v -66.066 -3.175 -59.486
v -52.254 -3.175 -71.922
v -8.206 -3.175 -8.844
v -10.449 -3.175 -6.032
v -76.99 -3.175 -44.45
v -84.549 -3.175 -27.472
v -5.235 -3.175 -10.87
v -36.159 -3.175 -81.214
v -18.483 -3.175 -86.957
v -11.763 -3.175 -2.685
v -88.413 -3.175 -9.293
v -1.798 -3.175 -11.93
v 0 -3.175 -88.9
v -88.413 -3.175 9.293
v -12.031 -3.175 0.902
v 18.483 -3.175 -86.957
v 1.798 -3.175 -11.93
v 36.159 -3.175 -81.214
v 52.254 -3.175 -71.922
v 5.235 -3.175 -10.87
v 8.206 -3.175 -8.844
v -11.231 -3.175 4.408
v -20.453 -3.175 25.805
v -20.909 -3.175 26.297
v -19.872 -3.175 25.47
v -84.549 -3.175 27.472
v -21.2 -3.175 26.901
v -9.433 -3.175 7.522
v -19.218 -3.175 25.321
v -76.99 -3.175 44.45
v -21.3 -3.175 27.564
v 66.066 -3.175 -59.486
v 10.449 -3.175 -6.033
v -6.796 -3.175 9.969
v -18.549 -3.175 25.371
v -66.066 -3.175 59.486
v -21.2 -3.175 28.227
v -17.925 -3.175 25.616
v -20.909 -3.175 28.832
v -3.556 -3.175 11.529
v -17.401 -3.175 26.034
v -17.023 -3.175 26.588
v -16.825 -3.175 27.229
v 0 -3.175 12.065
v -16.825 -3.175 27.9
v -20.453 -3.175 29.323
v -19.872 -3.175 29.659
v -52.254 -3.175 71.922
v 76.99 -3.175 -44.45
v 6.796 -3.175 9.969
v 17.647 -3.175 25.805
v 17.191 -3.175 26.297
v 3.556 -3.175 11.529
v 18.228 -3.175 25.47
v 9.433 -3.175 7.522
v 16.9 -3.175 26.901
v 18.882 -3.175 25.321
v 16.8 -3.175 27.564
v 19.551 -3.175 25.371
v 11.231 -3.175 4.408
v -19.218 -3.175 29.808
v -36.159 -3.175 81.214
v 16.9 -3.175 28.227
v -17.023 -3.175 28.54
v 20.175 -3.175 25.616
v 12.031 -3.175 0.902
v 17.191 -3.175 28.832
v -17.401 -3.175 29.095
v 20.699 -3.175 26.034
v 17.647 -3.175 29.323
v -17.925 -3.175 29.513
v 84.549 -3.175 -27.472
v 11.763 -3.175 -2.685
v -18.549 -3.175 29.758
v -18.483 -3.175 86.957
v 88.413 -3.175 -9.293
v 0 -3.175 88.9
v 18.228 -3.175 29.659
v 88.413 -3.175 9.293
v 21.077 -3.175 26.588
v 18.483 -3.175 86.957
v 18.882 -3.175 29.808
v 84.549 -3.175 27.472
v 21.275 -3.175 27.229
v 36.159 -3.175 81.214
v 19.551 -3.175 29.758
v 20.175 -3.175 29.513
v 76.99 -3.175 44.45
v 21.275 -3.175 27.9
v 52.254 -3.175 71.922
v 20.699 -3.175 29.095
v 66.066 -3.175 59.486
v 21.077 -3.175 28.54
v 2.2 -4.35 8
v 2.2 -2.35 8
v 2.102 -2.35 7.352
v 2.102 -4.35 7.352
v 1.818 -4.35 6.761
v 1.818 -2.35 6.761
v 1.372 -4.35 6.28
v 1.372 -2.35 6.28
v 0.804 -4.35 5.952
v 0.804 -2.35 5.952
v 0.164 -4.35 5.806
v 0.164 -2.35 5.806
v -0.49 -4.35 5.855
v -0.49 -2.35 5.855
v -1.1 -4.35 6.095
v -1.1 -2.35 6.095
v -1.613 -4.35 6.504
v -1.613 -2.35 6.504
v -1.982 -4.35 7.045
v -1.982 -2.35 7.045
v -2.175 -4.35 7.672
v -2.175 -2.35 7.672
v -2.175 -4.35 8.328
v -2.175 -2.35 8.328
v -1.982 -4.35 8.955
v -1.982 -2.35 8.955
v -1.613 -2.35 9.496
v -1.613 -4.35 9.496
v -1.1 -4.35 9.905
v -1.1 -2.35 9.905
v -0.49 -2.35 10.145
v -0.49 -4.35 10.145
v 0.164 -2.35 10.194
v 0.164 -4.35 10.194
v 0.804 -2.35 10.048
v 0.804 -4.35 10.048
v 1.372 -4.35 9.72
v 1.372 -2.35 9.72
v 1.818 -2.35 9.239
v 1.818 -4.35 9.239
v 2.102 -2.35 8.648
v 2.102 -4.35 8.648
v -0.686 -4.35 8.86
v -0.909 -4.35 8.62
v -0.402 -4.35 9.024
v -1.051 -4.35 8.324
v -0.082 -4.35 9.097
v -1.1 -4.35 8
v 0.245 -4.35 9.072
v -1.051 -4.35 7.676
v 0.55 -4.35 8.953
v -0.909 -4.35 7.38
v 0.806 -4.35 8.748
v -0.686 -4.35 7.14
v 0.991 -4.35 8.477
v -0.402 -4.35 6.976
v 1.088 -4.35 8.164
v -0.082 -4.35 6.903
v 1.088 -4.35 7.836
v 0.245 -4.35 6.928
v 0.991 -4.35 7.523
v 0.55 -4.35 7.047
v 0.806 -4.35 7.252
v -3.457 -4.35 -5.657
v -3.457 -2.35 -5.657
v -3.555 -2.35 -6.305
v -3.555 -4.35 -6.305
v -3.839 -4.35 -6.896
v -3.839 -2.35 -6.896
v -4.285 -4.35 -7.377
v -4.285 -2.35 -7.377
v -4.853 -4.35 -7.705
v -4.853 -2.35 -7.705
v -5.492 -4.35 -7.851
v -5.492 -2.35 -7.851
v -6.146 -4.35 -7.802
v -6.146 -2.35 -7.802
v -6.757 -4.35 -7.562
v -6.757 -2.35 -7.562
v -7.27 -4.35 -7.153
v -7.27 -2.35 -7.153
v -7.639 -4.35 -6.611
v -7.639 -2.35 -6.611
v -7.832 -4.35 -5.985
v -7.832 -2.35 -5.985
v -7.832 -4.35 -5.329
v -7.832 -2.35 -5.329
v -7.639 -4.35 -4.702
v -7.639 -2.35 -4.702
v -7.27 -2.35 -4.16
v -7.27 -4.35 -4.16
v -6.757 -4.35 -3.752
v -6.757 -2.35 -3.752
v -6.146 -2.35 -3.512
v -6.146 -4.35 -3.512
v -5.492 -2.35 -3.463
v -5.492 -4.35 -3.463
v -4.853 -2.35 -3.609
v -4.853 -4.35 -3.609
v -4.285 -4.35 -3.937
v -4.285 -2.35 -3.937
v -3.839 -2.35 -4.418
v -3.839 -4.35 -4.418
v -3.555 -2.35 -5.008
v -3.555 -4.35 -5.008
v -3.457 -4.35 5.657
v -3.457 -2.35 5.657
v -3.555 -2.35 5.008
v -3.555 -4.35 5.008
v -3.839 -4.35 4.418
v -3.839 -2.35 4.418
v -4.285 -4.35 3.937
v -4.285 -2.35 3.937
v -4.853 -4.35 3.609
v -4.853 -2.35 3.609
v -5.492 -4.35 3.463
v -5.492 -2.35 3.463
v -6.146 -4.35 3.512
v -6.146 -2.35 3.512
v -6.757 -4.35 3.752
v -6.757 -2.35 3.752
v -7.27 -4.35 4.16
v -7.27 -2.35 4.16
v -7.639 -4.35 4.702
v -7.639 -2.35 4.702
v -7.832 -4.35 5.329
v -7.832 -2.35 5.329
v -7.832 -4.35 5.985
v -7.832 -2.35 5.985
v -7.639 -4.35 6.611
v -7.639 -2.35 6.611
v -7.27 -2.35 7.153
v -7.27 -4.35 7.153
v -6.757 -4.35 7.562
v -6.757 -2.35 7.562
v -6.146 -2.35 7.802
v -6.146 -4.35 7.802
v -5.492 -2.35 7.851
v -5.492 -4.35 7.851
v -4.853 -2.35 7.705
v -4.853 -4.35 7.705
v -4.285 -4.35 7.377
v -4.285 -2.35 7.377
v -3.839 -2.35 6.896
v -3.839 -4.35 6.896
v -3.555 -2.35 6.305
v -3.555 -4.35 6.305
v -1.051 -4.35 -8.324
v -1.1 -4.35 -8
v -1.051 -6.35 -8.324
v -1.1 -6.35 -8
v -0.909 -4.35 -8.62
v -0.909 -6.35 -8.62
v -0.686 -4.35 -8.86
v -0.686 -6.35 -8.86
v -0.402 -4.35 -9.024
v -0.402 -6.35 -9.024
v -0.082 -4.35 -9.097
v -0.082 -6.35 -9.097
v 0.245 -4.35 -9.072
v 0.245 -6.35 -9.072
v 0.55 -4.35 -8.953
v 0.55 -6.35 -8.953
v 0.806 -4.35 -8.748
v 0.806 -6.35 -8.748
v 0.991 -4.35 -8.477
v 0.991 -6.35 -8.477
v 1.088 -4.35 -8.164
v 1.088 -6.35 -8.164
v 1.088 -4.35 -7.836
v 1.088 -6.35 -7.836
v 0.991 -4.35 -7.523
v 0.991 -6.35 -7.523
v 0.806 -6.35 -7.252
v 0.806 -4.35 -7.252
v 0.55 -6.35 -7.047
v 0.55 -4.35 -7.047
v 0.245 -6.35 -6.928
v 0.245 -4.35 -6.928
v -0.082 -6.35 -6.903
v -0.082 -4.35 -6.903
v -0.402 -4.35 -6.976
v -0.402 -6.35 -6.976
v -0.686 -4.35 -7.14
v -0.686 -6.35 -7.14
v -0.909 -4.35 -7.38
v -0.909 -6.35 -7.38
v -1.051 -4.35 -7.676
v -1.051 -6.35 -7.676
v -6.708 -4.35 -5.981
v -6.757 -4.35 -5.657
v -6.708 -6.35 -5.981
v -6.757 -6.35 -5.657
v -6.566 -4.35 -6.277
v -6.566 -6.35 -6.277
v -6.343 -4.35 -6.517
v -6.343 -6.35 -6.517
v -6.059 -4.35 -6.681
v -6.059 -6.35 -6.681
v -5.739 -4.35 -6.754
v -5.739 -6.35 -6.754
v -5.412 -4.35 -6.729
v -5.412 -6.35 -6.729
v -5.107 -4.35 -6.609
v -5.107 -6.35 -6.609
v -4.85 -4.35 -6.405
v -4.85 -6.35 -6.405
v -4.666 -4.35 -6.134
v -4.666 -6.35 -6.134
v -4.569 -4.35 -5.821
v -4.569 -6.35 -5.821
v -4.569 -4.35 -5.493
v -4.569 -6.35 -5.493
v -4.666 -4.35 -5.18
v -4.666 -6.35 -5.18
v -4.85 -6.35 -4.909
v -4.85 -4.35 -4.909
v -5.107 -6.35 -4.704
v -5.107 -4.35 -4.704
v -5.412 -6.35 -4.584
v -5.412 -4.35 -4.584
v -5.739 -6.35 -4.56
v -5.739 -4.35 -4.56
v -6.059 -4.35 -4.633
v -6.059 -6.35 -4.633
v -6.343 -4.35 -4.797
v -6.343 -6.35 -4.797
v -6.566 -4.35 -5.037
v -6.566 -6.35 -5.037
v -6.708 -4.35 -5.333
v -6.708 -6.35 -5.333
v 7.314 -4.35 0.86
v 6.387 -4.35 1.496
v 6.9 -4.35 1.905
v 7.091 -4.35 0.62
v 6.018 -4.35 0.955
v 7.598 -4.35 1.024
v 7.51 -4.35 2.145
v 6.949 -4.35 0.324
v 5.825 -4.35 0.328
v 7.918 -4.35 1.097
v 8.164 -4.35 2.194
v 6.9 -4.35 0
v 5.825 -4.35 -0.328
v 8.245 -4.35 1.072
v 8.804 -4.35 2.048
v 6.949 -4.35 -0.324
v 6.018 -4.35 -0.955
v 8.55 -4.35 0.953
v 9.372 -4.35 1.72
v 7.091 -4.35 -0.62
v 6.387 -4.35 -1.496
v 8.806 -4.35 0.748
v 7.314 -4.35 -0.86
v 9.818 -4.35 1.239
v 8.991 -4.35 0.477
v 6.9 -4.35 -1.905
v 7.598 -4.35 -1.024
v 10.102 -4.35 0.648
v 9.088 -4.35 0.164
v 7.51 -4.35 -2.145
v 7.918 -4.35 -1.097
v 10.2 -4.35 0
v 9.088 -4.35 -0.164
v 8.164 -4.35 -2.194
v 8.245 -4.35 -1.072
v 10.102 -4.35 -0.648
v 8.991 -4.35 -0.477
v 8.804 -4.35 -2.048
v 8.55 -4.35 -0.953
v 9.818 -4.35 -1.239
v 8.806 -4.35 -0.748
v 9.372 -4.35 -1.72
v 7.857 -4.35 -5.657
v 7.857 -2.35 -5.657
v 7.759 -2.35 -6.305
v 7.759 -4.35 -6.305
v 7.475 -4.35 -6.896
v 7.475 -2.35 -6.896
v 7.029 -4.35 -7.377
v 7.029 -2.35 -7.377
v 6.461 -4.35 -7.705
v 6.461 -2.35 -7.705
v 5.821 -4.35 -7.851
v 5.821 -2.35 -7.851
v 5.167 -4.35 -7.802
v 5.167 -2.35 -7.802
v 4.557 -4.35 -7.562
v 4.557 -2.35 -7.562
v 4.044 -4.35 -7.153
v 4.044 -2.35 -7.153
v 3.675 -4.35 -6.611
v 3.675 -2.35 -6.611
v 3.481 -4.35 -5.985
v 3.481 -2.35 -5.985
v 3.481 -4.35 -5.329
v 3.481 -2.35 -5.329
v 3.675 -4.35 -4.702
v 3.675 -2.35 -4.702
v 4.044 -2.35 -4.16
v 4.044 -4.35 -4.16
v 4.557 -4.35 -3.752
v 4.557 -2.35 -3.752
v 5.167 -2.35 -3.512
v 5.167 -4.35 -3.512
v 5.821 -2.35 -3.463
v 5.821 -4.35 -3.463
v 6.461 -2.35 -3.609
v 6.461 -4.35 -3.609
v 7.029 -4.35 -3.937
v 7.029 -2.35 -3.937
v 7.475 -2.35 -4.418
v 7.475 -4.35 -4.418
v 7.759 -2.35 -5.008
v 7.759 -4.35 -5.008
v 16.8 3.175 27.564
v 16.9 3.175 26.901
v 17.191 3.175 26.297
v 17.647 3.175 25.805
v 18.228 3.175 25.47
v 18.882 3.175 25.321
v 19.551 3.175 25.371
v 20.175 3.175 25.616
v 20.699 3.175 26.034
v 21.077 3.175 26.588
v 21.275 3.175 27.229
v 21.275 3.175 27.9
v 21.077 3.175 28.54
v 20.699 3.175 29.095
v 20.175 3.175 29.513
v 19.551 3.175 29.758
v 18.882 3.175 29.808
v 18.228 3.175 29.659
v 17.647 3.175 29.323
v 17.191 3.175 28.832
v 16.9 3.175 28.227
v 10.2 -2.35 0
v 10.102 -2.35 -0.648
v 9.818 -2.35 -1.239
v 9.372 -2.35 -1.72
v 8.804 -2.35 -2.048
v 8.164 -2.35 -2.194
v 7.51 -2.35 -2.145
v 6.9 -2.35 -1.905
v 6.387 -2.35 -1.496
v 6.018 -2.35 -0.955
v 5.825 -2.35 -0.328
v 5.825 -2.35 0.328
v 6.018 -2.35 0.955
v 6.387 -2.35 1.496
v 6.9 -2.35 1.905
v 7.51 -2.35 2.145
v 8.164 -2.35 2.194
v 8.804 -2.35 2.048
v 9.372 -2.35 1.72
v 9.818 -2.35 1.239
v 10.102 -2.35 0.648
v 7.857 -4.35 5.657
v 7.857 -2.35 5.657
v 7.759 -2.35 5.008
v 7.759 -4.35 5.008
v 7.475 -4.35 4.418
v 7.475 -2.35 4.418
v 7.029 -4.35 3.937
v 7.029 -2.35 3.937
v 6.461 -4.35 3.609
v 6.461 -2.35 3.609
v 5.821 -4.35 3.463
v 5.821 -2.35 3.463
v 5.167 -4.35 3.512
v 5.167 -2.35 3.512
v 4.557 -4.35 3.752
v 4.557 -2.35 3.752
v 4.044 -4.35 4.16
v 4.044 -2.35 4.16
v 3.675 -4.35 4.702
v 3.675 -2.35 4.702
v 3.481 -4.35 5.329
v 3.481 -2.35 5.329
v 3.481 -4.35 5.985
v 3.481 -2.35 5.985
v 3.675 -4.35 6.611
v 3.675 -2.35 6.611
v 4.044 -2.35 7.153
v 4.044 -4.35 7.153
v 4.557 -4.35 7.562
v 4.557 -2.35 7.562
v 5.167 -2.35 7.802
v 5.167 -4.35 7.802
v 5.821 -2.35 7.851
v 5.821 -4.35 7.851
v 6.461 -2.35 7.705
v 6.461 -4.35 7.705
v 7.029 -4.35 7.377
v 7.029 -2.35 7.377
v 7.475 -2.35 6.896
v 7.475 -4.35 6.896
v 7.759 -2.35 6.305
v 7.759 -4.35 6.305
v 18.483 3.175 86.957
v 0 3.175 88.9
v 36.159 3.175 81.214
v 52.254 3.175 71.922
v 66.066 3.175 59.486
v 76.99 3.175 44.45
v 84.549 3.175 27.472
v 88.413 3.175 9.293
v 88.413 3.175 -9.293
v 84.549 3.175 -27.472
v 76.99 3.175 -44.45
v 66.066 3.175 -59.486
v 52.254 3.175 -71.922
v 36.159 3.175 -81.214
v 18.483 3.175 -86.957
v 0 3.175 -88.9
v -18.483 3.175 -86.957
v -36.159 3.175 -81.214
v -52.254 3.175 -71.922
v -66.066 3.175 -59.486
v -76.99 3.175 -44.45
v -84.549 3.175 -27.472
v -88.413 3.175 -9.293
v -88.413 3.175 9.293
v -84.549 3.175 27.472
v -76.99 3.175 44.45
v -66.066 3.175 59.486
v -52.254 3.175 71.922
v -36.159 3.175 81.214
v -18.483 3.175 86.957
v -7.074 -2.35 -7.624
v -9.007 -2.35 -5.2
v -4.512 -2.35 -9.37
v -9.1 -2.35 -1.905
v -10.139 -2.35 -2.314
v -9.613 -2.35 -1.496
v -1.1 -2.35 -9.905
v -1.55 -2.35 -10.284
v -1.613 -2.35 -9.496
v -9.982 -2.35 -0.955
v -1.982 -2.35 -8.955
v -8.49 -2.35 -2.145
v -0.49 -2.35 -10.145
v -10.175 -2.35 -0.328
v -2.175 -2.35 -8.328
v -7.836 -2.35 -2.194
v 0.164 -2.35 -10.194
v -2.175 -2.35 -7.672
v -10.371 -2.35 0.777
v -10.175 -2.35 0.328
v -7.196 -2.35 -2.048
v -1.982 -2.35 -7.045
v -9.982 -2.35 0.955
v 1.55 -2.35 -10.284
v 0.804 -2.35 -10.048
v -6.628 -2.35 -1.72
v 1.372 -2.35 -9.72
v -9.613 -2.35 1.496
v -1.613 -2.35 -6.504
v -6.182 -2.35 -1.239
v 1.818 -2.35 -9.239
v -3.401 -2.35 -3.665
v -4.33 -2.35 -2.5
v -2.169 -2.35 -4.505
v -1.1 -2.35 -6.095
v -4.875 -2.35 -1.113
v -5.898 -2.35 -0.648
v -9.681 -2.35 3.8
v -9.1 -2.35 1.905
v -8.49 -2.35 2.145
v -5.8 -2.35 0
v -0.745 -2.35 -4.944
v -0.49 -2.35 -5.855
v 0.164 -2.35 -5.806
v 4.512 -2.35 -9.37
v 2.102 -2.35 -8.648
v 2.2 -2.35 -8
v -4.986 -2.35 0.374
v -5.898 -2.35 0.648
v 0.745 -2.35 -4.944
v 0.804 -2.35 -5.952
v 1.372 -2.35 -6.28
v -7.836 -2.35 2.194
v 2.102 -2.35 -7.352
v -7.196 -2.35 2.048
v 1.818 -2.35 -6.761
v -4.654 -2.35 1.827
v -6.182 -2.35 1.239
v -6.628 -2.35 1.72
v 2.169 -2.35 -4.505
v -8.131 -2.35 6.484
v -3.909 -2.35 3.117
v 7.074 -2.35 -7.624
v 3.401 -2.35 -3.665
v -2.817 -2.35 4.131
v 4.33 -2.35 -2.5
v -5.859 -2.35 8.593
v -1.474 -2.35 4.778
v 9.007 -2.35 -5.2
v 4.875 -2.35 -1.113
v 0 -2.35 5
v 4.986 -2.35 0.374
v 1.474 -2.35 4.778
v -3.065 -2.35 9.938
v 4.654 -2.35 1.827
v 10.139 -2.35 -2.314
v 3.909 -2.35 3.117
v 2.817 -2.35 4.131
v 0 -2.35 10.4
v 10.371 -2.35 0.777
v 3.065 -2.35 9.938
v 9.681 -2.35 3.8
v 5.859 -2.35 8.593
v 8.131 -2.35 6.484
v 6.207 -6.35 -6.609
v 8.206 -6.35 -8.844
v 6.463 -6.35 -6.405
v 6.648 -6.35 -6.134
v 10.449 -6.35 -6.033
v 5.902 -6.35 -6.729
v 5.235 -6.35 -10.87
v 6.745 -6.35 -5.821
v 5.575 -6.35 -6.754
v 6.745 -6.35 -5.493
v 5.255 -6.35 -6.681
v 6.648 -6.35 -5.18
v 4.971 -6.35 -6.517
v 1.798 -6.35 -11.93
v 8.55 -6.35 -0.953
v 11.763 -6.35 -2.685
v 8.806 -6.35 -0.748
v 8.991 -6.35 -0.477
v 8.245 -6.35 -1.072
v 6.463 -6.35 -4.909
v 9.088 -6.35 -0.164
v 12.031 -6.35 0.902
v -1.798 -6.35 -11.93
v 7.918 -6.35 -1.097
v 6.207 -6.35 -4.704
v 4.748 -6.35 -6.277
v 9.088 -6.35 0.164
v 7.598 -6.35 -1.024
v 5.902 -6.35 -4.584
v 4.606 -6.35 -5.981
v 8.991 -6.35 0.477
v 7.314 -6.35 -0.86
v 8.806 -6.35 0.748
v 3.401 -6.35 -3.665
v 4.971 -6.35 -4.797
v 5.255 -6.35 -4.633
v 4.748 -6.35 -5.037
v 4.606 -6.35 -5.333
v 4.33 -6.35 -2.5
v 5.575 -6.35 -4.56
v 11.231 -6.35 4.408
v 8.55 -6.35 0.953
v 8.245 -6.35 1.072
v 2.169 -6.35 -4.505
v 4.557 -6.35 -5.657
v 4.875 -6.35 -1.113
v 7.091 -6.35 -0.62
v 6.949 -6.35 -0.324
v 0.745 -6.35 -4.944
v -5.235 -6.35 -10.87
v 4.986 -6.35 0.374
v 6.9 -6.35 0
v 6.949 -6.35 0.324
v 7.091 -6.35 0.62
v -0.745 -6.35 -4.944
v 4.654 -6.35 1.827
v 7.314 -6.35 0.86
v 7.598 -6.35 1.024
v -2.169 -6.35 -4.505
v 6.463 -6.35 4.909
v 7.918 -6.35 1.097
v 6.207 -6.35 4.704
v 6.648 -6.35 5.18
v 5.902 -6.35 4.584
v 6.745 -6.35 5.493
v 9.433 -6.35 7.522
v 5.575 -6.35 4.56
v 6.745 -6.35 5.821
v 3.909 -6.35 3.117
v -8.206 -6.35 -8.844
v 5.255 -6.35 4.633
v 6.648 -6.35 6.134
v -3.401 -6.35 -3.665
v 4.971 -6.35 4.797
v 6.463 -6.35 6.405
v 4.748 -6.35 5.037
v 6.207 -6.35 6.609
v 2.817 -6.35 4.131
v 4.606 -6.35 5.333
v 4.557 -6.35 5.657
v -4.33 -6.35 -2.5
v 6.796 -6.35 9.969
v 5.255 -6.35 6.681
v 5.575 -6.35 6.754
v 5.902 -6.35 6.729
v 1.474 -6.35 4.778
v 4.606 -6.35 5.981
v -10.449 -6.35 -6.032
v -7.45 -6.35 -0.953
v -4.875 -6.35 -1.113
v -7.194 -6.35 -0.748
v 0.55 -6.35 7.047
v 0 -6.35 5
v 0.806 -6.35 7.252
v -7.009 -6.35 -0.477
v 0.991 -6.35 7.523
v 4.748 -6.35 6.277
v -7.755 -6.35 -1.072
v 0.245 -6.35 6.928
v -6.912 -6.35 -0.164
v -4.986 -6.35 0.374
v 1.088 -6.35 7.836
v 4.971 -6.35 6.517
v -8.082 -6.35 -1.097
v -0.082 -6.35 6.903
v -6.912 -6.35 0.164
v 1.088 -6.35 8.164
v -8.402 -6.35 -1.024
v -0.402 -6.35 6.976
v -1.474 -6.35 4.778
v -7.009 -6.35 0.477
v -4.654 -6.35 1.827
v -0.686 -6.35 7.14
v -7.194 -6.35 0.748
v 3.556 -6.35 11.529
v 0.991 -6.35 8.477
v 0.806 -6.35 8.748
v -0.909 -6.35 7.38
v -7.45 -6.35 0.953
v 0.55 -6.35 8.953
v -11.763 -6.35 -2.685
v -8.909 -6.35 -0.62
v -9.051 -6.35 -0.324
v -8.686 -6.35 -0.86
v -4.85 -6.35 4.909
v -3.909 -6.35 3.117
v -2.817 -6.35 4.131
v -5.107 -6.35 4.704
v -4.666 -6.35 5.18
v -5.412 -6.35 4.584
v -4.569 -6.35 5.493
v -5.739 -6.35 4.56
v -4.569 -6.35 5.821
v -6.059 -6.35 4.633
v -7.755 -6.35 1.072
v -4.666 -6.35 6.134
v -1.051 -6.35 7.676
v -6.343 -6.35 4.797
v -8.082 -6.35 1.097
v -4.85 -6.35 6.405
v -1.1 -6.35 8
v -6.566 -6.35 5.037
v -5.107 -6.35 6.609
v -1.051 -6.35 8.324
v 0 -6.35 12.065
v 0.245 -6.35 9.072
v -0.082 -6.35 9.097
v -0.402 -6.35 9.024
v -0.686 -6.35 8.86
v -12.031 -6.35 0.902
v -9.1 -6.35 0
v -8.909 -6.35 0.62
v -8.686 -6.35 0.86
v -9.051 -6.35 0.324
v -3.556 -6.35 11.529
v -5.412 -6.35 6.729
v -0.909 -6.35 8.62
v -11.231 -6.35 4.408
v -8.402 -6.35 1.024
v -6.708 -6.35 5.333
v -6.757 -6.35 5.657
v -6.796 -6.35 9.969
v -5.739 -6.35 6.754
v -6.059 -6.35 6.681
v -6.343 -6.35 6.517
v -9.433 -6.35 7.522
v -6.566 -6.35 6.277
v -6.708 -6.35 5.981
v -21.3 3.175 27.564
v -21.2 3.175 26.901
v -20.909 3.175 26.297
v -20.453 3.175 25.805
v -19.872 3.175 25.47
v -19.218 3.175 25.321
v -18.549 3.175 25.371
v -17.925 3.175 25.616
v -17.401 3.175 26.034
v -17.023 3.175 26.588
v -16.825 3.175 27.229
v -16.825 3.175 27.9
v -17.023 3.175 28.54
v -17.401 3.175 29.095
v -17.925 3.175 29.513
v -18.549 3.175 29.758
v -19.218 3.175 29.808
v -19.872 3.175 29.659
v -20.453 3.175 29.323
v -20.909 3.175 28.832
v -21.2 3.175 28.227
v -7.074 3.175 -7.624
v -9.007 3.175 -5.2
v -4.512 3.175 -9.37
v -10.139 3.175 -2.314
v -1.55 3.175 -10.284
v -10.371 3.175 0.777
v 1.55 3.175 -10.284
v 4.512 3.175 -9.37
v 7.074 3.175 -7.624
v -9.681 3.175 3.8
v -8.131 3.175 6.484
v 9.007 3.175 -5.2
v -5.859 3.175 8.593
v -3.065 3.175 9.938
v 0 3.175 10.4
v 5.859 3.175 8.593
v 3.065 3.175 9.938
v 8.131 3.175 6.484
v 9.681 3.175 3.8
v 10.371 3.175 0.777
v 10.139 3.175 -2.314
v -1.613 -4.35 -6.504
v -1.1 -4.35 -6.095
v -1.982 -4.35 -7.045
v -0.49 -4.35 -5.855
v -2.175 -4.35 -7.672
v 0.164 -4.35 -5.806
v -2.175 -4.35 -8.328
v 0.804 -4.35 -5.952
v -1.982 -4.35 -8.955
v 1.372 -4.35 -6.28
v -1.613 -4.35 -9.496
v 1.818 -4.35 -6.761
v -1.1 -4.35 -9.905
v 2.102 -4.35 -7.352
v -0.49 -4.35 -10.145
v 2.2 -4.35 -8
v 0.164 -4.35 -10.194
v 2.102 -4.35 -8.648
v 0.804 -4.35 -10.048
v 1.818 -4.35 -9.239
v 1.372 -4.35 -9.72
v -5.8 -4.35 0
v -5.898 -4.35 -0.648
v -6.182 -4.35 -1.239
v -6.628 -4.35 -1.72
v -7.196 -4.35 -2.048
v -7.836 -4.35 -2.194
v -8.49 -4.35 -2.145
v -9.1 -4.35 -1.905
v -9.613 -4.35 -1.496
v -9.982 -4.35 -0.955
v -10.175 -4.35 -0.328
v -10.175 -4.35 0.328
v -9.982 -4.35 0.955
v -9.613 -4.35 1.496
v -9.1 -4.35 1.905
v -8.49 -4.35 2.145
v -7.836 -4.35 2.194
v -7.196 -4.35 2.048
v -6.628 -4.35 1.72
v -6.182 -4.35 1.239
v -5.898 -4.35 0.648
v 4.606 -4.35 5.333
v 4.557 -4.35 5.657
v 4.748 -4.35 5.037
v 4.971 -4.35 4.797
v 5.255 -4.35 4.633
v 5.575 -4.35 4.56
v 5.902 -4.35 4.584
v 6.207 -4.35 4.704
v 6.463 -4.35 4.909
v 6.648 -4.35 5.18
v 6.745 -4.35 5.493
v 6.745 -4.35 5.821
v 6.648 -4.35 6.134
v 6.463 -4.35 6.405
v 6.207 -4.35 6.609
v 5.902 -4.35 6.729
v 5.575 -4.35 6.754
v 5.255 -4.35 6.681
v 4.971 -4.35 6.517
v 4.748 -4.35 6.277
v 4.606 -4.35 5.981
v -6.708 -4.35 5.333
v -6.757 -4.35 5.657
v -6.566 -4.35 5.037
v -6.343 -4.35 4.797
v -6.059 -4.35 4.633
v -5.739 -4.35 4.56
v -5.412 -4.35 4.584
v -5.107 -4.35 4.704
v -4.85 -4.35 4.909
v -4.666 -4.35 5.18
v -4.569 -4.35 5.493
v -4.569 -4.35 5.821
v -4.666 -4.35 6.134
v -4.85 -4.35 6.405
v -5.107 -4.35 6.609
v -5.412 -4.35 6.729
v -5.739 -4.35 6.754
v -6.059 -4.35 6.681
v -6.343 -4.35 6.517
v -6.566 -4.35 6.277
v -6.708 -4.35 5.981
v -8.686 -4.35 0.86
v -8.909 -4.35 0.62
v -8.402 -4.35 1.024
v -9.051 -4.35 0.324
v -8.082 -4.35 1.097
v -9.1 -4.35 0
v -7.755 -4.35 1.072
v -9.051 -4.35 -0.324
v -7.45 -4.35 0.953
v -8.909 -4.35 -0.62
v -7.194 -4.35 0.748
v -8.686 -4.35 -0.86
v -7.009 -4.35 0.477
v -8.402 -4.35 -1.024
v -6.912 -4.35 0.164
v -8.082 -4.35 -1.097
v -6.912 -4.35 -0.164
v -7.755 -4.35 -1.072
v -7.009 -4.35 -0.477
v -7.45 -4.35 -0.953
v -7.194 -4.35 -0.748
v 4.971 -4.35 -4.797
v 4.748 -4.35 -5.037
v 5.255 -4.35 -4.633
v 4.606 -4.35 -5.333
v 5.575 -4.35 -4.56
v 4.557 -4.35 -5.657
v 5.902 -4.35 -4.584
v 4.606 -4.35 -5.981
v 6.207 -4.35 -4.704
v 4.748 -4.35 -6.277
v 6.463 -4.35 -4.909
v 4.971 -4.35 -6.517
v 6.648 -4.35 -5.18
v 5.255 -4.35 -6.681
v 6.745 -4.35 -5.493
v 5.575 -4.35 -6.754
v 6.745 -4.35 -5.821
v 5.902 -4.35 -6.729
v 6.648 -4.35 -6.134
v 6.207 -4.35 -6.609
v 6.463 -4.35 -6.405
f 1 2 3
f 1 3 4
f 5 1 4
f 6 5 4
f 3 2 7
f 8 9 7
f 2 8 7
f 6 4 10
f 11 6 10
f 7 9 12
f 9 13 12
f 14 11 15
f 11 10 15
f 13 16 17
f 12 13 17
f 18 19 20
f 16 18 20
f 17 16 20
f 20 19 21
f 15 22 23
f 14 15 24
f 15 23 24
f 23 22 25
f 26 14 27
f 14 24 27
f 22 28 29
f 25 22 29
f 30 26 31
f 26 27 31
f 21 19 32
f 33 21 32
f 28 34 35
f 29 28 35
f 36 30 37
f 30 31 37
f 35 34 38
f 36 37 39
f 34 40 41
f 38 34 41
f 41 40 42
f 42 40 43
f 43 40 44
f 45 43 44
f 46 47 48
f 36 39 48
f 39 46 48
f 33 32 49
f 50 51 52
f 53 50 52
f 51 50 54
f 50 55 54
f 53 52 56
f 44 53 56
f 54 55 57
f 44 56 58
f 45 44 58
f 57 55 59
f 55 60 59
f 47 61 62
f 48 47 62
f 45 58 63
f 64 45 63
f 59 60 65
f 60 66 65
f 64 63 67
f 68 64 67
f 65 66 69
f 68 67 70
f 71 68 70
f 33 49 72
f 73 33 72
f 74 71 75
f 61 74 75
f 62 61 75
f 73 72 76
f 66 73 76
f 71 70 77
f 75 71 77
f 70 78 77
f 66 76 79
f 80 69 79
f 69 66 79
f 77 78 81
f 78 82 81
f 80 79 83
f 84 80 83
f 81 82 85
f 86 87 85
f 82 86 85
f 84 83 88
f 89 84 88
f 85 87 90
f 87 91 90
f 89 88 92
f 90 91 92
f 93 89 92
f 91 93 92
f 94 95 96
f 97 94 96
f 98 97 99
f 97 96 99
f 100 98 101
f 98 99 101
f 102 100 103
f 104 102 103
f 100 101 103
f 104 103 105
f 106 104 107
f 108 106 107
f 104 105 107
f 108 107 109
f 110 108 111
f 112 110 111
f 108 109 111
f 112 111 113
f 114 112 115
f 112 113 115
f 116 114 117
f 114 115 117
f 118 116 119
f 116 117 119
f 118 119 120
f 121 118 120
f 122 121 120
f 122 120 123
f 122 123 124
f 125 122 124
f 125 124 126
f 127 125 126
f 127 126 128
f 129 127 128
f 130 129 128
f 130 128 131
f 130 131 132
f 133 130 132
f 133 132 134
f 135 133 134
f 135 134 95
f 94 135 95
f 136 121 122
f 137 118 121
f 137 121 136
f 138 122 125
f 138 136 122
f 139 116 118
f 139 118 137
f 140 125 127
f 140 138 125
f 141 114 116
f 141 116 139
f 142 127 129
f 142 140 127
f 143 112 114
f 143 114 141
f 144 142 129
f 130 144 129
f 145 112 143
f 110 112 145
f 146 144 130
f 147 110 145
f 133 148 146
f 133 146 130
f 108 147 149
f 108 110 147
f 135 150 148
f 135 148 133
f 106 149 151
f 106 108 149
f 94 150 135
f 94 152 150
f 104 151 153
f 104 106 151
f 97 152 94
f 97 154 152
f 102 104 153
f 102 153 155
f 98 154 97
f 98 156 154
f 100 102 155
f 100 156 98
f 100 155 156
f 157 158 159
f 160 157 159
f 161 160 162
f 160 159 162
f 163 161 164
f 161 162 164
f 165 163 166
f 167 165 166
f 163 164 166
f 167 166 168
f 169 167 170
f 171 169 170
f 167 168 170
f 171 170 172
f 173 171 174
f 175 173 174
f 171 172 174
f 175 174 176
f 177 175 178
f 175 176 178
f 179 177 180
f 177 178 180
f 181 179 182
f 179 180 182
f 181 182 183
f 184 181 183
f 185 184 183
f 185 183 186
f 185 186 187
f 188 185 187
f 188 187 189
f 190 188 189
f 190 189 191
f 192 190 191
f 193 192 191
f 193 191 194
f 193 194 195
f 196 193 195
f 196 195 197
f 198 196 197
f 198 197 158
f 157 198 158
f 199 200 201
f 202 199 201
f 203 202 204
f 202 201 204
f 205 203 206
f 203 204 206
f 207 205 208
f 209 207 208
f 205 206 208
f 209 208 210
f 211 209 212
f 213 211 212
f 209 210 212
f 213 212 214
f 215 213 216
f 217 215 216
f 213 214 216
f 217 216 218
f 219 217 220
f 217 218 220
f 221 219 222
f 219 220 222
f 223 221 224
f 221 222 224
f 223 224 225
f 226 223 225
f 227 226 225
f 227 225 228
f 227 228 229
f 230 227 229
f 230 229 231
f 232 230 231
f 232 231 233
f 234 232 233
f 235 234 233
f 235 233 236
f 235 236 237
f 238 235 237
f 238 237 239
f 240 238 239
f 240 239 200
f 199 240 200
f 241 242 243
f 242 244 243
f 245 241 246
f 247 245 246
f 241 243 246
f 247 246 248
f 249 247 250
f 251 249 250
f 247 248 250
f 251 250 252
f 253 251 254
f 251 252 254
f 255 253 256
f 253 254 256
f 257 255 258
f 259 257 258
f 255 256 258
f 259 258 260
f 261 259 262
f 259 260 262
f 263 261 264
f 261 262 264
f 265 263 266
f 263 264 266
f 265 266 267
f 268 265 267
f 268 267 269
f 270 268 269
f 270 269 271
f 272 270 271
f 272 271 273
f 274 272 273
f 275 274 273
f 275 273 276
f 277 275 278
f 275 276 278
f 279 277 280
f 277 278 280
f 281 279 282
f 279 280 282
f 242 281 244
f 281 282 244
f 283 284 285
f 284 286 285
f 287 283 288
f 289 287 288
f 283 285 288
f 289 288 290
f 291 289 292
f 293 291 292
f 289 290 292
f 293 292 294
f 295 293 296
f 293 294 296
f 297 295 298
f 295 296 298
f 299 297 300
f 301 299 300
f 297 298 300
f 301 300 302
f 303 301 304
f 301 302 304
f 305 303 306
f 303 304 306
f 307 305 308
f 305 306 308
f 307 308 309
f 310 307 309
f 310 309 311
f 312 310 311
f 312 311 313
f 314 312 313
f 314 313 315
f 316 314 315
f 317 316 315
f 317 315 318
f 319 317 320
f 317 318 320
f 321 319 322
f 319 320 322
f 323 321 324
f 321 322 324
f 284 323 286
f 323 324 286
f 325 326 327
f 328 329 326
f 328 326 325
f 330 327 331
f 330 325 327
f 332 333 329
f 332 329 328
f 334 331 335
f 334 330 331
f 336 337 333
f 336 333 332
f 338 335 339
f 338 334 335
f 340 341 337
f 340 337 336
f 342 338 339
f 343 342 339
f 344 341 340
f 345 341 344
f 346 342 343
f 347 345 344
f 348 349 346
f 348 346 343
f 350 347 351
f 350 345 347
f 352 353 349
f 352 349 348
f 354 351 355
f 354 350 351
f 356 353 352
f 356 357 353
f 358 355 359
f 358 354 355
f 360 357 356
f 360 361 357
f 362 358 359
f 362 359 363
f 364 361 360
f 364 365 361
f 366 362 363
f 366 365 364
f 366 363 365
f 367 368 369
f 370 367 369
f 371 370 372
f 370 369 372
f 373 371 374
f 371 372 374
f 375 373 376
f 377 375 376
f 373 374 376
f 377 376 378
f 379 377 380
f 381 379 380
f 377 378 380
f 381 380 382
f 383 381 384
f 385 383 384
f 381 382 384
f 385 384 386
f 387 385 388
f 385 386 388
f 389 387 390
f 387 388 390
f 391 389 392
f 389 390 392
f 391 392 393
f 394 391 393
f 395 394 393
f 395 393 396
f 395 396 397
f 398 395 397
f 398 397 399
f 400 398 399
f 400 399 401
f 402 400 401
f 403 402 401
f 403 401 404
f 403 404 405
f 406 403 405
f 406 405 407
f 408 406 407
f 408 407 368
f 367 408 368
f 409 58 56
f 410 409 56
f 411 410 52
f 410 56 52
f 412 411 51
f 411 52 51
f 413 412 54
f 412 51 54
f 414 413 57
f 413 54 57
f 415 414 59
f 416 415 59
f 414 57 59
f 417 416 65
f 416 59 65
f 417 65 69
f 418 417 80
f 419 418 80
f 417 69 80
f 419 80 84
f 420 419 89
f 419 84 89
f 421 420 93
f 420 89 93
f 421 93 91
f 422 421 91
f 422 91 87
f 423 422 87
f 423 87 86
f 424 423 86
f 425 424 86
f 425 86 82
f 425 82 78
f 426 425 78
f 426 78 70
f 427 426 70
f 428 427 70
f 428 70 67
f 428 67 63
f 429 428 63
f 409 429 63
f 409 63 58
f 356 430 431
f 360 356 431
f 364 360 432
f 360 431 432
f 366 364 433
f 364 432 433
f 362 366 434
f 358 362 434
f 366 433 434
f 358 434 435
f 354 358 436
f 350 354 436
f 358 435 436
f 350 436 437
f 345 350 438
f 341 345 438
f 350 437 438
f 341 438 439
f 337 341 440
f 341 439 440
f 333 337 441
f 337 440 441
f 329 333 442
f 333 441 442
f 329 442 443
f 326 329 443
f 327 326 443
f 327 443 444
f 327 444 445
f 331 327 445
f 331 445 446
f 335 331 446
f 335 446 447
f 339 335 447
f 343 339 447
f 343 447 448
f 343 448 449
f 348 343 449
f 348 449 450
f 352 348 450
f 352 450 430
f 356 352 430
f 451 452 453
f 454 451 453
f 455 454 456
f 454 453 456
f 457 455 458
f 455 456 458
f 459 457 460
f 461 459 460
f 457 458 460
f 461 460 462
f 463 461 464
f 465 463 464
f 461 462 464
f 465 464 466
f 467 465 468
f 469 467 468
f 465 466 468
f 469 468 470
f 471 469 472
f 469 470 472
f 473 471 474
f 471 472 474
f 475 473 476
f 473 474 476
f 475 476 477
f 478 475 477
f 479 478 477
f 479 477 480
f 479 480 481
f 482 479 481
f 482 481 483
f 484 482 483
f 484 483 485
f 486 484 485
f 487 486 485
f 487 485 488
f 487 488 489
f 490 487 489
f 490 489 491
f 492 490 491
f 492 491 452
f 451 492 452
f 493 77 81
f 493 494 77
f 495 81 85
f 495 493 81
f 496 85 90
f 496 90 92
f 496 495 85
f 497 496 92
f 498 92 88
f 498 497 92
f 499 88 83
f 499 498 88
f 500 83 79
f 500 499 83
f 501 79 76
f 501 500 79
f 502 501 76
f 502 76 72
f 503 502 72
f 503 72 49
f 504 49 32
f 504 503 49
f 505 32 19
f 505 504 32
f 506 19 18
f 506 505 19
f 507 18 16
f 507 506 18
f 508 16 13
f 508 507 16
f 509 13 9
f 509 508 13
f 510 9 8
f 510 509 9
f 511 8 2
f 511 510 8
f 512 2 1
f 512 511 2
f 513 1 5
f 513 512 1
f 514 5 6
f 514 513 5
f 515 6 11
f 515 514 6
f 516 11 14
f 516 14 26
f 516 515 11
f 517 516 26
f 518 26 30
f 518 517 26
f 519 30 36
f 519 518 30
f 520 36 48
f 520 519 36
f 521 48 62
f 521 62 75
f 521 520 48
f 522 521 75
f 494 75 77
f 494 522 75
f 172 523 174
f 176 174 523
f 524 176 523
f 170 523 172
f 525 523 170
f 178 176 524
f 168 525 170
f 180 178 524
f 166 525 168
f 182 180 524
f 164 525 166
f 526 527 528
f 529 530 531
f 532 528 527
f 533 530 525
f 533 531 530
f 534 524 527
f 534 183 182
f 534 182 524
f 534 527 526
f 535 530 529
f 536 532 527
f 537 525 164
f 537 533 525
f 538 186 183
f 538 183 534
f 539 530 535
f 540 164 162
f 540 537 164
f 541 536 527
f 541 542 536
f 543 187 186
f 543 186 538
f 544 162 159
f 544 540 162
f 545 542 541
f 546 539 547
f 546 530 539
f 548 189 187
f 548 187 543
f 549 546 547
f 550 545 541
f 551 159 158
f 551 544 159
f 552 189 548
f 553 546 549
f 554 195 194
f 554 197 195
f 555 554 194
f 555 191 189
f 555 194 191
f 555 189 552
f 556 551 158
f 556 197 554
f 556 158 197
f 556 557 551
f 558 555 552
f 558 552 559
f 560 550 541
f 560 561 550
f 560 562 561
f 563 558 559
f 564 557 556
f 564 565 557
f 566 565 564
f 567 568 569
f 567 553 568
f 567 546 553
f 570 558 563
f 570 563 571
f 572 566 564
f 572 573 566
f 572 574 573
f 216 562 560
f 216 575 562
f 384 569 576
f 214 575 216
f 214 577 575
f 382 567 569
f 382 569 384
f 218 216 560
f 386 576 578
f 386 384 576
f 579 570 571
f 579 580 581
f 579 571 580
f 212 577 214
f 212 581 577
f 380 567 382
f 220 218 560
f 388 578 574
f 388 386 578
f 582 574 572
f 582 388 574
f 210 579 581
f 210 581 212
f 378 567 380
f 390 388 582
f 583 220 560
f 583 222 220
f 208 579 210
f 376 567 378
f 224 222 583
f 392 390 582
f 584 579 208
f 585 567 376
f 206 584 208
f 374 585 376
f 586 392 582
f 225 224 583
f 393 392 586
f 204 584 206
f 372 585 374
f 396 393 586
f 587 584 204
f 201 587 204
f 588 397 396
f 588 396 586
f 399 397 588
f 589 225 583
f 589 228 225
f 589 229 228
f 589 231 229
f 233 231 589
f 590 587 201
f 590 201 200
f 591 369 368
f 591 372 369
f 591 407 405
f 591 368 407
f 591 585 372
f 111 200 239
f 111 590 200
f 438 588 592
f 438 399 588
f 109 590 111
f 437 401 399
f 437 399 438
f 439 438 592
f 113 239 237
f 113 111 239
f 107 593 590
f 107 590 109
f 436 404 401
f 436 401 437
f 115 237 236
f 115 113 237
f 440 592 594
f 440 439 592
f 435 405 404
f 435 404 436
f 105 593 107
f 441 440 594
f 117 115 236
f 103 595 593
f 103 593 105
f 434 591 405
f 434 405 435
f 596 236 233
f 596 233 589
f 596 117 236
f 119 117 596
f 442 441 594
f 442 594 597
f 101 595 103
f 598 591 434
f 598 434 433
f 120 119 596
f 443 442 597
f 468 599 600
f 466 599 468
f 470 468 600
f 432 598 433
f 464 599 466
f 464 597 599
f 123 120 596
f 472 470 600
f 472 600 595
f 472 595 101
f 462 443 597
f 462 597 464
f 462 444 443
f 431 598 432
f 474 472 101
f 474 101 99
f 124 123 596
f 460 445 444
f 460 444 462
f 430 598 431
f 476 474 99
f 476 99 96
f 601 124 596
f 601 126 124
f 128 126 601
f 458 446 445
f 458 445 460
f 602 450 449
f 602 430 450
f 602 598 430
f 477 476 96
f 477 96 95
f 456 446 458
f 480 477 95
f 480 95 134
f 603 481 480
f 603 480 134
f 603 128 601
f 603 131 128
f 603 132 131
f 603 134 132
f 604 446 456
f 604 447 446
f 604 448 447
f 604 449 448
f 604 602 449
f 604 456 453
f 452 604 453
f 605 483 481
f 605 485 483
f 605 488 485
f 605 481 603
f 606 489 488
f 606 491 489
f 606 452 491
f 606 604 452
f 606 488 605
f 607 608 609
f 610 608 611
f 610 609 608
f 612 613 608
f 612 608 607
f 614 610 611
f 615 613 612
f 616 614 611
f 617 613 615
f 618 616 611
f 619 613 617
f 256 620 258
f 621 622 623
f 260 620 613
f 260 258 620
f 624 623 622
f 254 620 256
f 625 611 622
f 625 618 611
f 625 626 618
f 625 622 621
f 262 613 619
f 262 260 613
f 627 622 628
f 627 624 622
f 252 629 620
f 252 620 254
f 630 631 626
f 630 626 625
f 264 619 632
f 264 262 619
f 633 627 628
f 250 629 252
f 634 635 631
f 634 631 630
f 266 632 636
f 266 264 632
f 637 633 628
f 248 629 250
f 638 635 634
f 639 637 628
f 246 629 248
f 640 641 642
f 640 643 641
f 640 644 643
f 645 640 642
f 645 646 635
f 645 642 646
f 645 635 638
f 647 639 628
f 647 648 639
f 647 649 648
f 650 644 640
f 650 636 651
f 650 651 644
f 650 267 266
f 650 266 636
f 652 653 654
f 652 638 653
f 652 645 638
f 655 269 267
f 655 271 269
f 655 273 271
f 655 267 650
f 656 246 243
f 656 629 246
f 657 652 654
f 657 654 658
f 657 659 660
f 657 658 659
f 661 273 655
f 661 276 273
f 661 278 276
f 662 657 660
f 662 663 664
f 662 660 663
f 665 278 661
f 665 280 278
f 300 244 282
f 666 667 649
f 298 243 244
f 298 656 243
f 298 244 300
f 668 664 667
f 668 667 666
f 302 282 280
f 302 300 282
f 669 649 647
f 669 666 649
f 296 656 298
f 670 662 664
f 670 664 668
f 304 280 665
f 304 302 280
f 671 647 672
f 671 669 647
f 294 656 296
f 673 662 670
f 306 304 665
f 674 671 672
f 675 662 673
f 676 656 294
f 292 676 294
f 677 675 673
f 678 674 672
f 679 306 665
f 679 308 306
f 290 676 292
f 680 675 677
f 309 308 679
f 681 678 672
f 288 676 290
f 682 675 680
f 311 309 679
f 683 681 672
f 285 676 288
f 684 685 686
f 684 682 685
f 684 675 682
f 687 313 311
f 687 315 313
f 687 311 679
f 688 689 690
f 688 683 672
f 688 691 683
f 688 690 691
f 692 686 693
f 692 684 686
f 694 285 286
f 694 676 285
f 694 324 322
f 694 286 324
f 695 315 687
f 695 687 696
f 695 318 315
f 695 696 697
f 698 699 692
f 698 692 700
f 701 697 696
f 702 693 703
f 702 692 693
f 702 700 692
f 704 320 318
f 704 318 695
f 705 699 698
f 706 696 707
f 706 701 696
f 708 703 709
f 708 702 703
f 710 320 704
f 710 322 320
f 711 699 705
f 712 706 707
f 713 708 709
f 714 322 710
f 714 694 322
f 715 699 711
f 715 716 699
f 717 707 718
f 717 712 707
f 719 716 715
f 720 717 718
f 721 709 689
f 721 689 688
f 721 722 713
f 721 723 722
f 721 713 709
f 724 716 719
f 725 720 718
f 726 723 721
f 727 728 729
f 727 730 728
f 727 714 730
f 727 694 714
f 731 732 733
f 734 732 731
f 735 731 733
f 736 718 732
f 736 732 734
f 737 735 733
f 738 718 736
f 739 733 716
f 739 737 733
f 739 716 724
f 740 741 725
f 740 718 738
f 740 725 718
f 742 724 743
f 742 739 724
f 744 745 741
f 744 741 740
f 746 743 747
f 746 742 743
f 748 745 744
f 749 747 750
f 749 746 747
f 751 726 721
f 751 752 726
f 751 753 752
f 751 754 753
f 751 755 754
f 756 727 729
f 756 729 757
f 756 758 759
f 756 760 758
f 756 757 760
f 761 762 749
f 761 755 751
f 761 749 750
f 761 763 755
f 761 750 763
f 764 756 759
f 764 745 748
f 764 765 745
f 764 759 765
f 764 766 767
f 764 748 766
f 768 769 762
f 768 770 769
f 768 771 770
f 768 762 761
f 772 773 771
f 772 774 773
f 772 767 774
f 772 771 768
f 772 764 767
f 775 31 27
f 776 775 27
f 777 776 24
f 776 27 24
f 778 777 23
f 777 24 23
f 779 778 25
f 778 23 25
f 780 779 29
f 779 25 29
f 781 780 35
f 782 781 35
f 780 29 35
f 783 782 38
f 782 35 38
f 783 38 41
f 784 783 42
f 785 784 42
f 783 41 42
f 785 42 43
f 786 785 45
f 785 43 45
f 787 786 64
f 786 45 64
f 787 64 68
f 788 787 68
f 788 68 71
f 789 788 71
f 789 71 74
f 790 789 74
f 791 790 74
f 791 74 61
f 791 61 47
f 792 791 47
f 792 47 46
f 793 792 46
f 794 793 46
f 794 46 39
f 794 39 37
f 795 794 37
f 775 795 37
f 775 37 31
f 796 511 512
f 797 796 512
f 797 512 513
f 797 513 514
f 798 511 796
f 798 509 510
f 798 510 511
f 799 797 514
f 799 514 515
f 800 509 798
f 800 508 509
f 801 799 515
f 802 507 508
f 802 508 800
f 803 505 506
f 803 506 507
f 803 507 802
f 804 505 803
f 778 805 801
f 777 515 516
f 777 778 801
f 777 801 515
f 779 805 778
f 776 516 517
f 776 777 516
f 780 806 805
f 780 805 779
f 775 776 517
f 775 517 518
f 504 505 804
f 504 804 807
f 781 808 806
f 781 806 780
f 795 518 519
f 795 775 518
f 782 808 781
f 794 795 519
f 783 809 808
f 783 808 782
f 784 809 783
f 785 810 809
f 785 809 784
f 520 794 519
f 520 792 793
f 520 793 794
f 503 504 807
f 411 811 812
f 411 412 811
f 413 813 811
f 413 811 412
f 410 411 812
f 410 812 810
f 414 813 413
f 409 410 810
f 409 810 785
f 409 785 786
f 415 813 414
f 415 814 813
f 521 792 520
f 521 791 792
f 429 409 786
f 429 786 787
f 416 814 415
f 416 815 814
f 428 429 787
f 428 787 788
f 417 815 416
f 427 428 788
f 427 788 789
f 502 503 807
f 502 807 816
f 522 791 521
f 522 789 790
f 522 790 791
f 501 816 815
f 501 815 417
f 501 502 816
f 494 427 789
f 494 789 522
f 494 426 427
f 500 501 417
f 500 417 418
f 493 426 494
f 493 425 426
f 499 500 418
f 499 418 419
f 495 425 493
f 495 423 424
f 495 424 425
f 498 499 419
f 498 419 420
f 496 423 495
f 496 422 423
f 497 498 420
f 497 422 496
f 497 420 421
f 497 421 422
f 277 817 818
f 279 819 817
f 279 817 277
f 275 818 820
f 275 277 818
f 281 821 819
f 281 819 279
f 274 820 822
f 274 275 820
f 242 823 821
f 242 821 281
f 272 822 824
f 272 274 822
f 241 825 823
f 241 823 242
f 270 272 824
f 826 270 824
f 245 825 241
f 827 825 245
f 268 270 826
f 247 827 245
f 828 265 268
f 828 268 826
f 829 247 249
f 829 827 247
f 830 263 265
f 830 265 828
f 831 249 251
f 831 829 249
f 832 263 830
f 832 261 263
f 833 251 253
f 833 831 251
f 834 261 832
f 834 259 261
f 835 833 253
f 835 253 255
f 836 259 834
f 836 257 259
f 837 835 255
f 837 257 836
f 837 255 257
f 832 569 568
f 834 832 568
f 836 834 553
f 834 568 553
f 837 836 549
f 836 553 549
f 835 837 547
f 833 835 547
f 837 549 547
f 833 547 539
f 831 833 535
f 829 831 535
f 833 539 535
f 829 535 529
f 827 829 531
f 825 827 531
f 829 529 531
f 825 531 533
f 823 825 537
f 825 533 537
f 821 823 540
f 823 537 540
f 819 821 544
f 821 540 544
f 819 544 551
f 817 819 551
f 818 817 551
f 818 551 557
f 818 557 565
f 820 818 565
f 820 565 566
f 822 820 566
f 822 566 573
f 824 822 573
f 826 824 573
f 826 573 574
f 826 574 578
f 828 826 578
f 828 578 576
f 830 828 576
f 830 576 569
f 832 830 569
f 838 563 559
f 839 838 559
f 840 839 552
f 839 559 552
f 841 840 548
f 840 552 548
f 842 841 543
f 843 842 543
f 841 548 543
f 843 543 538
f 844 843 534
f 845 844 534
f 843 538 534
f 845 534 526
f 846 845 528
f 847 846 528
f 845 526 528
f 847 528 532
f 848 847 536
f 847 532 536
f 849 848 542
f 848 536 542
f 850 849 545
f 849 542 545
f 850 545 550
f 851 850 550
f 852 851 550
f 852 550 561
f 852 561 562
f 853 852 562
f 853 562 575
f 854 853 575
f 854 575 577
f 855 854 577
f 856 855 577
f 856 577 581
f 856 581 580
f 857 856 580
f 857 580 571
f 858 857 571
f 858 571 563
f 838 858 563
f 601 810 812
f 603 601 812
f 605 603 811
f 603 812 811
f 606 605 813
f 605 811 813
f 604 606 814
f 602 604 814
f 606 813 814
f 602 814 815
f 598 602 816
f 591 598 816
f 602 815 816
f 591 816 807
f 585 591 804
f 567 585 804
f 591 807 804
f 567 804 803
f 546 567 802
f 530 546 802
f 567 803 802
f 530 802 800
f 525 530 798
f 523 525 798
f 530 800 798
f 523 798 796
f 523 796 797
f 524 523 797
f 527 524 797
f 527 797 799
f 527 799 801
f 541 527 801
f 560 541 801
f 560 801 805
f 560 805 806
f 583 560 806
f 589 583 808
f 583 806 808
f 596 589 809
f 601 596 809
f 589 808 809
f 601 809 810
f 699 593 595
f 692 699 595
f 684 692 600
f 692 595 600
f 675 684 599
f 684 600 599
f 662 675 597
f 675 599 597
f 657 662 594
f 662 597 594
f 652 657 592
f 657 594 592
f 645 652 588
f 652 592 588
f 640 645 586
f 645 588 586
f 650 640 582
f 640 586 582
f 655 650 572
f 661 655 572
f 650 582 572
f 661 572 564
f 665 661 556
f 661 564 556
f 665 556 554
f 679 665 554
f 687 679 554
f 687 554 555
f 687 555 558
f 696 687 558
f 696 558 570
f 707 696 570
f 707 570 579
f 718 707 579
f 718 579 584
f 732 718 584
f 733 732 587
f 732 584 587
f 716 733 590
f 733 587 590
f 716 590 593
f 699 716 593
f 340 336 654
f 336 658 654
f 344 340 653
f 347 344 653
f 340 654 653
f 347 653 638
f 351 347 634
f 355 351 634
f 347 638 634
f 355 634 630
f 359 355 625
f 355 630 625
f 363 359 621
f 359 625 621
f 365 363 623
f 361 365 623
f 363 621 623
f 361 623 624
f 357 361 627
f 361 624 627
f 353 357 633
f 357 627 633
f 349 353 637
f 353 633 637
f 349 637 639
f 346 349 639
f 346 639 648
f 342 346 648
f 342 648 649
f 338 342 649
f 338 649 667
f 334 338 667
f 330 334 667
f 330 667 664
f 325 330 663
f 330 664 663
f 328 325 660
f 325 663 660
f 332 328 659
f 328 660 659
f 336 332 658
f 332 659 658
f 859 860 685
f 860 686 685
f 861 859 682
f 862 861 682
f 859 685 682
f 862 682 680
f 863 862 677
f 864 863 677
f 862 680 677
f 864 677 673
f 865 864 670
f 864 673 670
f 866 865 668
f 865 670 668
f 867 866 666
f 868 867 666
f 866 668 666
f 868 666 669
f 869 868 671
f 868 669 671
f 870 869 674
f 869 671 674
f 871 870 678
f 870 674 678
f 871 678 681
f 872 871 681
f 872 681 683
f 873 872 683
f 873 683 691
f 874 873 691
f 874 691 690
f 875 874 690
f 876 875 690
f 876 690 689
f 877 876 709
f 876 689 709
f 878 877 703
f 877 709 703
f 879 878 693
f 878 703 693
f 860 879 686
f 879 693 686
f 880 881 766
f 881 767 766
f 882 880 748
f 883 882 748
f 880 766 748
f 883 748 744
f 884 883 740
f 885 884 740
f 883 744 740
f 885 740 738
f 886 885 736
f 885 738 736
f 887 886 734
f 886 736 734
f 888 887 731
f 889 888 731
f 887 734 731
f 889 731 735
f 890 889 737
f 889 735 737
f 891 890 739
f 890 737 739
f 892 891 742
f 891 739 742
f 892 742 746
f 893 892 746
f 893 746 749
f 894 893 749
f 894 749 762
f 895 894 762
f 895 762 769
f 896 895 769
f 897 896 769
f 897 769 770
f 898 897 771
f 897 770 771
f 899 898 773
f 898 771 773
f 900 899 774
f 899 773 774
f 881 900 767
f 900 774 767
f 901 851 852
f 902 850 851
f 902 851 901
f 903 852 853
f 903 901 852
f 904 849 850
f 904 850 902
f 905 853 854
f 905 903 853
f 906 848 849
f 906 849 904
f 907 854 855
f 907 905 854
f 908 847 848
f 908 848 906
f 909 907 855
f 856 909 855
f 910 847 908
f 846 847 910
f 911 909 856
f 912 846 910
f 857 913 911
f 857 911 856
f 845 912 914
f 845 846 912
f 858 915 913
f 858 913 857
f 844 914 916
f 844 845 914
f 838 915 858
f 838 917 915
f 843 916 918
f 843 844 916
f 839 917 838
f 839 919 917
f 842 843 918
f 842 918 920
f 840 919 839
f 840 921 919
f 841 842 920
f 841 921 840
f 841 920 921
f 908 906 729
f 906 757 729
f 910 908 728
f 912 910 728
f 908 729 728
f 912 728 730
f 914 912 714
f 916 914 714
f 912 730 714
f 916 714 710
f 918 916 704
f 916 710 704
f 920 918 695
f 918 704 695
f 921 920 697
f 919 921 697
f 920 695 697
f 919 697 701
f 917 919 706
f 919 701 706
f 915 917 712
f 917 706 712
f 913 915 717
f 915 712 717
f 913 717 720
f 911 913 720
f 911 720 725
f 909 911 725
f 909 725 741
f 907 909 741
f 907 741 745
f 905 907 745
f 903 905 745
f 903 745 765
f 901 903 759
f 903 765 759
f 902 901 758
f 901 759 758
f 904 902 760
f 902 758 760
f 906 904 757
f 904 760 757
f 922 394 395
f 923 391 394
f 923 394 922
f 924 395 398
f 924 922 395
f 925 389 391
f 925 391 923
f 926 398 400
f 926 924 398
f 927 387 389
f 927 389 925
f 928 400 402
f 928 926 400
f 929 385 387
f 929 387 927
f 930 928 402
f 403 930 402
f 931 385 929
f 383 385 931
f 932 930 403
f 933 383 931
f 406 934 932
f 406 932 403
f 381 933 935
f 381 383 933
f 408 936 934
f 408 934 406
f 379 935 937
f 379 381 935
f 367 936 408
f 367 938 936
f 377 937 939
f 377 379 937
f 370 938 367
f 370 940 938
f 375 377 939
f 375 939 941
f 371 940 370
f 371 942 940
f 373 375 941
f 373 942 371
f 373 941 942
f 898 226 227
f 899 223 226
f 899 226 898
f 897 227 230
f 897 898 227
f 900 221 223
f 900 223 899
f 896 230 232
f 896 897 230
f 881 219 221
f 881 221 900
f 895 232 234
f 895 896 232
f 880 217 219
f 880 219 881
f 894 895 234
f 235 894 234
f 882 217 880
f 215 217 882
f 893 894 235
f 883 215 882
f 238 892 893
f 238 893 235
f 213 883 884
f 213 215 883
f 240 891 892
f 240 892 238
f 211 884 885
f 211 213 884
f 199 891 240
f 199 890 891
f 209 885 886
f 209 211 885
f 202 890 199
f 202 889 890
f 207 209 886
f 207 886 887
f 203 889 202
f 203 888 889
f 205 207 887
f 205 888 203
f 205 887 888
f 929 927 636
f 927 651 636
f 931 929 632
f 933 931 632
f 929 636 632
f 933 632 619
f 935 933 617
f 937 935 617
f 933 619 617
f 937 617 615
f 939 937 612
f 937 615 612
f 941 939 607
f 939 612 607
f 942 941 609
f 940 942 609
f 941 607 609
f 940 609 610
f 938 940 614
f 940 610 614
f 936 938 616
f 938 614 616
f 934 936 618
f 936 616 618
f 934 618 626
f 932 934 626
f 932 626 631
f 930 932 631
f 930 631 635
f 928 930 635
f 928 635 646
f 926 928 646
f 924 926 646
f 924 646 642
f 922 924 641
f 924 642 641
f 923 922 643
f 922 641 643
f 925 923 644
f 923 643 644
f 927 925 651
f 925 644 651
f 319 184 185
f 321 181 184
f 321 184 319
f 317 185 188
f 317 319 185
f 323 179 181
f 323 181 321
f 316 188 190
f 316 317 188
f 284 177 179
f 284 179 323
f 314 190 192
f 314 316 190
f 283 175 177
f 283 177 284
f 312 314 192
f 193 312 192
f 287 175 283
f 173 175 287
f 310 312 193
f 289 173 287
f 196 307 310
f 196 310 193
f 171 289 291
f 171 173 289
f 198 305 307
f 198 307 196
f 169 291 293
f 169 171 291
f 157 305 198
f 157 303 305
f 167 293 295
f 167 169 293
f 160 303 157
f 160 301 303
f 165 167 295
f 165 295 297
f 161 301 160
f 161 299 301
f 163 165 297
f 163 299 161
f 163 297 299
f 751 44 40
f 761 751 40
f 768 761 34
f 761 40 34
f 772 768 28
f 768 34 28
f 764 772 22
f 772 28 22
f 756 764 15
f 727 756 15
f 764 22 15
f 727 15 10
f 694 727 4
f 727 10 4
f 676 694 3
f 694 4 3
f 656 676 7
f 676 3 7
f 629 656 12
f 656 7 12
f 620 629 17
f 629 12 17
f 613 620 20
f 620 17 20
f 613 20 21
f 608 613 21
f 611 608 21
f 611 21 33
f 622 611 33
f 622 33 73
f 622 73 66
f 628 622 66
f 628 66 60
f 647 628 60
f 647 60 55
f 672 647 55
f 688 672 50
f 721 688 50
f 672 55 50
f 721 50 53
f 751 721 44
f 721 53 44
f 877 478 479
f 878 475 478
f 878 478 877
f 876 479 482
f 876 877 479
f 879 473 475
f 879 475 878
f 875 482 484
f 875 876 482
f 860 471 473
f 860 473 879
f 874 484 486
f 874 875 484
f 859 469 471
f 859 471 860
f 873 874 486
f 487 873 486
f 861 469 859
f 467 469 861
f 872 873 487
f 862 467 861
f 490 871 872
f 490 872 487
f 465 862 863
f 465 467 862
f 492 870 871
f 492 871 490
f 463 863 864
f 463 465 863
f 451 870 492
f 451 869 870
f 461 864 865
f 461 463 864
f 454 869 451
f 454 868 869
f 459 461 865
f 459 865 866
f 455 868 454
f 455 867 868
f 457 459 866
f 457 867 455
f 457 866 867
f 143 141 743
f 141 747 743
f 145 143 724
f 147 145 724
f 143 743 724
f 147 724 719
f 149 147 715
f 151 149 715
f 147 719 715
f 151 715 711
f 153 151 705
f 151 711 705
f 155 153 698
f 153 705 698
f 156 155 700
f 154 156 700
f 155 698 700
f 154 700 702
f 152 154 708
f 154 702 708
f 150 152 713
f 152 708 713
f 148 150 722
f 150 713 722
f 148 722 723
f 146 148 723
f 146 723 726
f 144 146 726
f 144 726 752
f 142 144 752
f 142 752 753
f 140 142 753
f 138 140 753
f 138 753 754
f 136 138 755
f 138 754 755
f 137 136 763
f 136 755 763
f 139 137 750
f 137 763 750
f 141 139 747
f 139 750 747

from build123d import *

# Parameters (mm, degrees)
SKETCH1_R                      = 88.9
BOSS_EXTRUDE1_DEPTH            = 3.175
SKETCH2_R                      = 12.065
BOSS_EXTRUDE2_DEPTH            = 3.175
SKETCH5_R                      = 10.4
CUT_EXTRUDE1_DEPTH             = 5.525
SKETCH6_R                      = 5
CUT_EXTRUDE2_DEPTH             = 4
CBORE_FOR_M2_SHCS1_D           = 2.2
CBORE_FOR_M2_SHCS1_DEPTH       = 6
CBORE_FOR_M2_SHCS1_CBORE_D     = 4.4
CBORE_FOR_M2_SHCS1_CBORE_DEPTH = 2
CBORE_FOR_M2_SHCS1_TIP         = 0.660946681
M4_CLEARANCE_HOLE1_D           = 4.5


with BuildPart() as part:
    # Sketch1 → Boss-Extrude1 (new, symmetric)
    with BuildSketch(Plane(origin=(0, 0, 0), x_dir=(1, 0, 0), z_dir=(0, 1, 0))):
        with Locations(Location((0, 0, 0), (0, 0, 270))):
            Circle(SKETCH1_R)
    extrude(amount=BOSS_EXTRUDE1_DEPTH, both=True)

    # Sketch2 → Boss-Extrude2 (add)
    with BuildSketch(Plane.XZ.offset(3.175)):
        with Locations(Location((0, 0, 0), (0, 0, 90))):
            Circle(SKETCH2_R)
    extrude(amount=BOSS_EXTRUDE2_DEPTH)

    # Sketch5 → Cut-Extrude1 (cut)
    with BuildSketch(Plane(origin=(0, 3.175, 0), x_dir=(1, 0, 0), z_dir=(0, 1, 0))):
        with Locations(Location((0, 0, 0), (0, 0, 270))):
            Circle(SKETCH5_R)
    extrude(amount=-CUT_EXTRUDE1_DEPTH, mode=Mode.SUBTRACT)

    # Sketch6 → Cut-Extrude2 (cut)
    with BuildSketch(Plane(origin=(0, -2.35, 0), x_dir=(1, 0, 0), z_dir=(0, 1, 0))):
        with Locations(Location((0, 0, 0), (0, 0, 270))):
            Circle(SKETCH6_R)
    extrude(amount=-CUT_EXTRUDE2_DEPTH, mode=Mode.SUBTRACT)

    # CBORE for M2 SHCS1
    with Locations(Plane(origin=(0, -2.35, 0), x_dir=(1, 0, 0), z_dir=(0, 1, 0))):
        with Locations((-5.65685425, 5.65685425), (0, 8), (5.65685425, 5.65685425), (8, 0), (5.65685425, -5.65685425), (0, -8), (-5.65685425, -5.65685425), (-8, 0)):
            CounterBoreHole(CBORE_FOR_M2_SHCS1_D / 2, CBORE_FOR_M2_SHCS1_CBORE_D / 2, CBORE_FOR_M2_SHCS1_CBORE_DEPTH, depth=CBORE_FOR_M2_SHCS1_DEPTH)
            with Locations((0, 0, -(CBORE_FOR_M2_SHCS1_DEPTH + CBORE_FOR_M2_SHCS1_TIP / 2))):  # 118° drill point
                Cone(0, CBORE_FOR_M2_SHCS1_D / 2, CBORE_FOR_M2_SHCS1_TIP, mode=Mode.SUBTRACT)

    # M4 Clearance Hole1 (through all)
    with Locations(Plane(origin=(0, 3.175, 0), x_dir=(1, 0, 0), z_dir=(0, 1, 0))):
        with Locations((19.05, -27.564242343), (-19.05, -27.564242343)):
            Hole(M4_CLEARANCE_HOLE1_D / 2)


solid = part.part
